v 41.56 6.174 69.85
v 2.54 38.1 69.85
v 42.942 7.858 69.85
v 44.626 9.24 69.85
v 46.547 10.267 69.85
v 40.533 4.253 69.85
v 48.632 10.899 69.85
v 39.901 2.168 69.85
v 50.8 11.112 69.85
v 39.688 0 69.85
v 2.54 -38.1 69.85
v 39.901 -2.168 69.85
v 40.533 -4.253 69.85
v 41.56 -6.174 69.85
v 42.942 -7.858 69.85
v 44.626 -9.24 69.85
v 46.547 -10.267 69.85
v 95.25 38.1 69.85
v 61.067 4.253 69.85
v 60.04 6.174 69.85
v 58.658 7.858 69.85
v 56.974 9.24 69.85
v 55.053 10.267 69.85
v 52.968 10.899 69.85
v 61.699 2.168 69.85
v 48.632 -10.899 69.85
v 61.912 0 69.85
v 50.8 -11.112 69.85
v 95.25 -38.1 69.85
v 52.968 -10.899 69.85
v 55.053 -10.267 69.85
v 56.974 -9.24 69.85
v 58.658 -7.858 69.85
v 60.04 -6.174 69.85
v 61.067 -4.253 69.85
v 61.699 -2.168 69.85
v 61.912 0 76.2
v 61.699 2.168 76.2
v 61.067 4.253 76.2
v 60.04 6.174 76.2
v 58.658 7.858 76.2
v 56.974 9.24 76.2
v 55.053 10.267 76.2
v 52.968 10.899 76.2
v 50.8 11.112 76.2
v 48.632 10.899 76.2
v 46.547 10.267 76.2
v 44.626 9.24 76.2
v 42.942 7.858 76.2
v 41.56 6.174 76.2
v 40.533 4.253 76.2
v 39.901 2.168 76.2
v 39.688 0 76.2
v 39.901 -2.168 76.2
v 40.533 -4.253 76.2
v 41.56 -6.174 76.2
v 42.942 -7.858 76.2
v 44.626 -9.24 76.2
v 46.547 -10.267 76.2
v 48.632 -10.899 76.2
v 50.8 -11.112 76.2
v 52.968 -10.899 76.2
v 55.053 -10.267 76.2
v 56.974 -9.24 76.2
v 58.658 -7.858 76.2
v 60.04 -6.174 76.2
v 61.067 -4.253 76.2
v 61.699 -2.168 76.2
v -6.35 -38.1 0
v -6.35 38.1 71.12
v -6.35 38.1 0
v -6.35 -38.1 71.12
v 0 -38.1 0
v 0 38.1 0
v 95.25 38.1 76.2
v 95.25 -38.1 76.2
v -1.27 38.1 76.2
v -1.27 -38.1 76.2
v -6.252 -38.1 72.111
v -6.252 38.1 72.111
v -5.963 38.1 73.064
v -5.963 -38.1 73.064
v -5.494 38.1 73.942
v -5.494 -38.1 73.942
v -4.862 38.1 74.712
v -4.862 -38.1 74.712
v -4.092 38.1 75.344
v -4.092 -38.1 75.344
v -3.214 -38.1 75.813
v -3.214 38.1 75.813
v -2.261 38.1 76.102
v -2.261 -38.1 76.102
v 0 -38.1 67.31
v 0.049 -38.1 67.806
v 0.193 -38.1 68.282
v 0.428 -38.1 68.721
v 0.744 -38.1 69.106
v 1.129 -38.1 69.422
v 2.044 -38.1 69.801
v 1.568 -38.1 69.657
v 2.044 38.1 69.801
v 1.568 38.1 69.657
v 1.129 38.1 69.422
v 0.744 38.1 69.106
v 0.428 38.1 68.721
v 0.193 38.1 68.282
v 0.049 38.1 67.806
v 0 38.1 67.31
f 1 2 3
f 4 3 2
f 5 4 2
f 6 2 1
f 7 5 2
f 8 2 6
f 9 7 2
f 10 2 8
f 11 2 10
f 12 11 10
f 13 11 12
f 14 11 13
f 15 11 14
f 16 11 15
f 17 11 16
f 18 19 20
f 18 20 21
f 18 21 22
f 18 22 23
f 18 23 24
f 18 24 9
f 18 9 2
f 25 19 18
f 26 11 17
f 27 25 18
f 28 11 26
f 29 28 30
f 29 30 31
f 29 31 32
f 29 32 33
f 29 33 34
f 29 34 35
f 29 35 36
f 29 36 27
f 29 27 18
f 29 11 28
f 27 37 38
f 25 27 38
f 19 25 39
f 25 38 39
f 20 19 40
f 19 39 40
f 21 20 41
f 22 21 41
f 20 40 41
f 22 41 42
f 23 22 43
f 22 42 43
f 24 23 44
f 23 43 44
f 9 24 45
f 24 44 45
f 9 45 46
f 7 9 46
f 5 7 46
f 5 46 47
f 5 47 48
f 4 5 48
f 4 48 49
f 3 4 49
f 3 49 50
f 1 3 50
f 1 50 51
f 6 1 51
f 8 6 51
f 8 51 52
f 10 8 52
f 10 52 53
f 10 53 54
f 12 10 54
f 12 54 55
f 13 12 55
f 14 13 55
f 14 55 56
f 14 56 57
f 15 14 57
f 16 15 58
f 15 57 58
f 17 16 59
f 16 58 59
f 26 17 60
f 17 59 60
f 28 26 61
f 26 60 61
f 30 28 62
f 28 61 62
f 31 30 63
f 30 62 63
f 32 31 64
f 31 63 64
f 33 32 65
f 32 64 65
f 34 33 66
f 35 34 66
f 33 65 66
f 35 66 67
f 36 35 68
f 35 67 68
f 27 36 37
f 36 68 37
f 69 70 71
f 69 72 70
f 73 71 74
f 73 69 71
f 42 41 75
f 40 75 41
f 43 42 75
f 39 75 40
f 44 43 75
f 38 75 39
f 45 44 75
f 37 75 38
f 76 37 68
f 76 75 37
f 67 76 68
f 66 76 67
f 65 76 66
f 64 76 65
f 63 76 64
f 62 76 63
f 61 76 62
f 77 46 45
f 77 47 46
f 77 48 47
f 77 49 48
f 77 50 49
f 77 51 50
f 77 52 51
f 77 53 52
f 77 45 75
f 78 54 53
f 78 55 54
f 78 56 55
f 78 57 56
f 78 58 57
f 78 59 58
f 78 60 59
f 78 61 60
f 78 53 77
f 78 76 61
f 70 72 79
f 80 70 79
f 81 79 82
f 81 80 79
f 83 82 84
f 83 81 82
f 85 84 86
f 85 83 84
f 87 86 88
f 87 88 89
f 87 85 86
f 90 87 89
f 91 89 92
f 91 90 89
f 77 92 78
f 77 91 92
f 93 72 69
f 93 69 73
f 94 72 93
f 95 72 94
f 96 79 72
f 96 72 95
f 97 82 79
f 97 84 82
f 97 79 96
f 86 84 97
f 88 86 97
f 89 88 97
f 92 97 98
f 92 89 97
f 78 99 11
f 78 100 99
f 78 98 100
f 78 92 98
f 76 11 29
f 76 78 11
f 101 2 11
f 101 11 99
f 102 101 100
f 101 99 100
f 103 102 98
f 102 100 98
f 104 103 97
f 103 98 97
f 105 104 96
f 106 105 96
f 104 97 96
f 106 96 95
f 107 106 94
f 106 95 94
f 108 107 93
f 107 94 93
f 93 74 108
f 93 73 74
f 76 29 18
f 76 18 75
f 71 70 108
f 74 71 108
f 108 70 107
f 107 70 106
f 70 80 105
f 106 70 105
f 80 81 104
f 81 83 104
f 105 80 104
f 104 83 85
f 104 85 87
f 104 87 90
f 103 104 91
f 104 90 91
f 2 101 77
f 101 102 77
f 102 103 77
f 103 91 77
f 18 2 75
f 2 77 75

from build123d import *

# Parameters (mm, degrees)
F1_DEPTH      = 38.1
F1_DEPTH_BACK = 38.1
F2_R          = 5.08
F3_R          = 2.54
F4_R          = 11.1125
F5_DEPTH      = 25.4


with BuildPart() as f1:
    # F0 (on Front) → F1 (new body, two sides)
    with BuildSketch(Plane.XZ) as f1_sk:
        Polygon((-6.35, 0), (0, 0), (0, 69.85), (95.25, 69.85), (95.25, 76.2), (-6.35, 76.2), align=None)
    extrude(amount=F1_DEPTH)
    extrude(f1_sk.sketch, amount=-F1_DEPTH_BACK)

    # F2
    f2_edges = [f1.edges().sort_by_distance(p)[0] for p in [
        (-6.35, 0, 76.2),
    ]]
    fillet(f2_edges, radius=F2_R)

    # F3
    f3_edges = [f1.edges().sort_by_distance(p)[0] for p in [
        (0, 0, 69.85),
    ]]
    fillet(f3_edges, radius=F3_R)

    # F4 (on face) → F5 (cut)
    with BuildSketch(Plane.XY.offset(76.2)):
        with Locations((50.8, 0)):
            Circle(F4_R)
    extrude(amount=-F5_DEPTH, mode=Mode.SUBTRACT)


solid = f1.part
